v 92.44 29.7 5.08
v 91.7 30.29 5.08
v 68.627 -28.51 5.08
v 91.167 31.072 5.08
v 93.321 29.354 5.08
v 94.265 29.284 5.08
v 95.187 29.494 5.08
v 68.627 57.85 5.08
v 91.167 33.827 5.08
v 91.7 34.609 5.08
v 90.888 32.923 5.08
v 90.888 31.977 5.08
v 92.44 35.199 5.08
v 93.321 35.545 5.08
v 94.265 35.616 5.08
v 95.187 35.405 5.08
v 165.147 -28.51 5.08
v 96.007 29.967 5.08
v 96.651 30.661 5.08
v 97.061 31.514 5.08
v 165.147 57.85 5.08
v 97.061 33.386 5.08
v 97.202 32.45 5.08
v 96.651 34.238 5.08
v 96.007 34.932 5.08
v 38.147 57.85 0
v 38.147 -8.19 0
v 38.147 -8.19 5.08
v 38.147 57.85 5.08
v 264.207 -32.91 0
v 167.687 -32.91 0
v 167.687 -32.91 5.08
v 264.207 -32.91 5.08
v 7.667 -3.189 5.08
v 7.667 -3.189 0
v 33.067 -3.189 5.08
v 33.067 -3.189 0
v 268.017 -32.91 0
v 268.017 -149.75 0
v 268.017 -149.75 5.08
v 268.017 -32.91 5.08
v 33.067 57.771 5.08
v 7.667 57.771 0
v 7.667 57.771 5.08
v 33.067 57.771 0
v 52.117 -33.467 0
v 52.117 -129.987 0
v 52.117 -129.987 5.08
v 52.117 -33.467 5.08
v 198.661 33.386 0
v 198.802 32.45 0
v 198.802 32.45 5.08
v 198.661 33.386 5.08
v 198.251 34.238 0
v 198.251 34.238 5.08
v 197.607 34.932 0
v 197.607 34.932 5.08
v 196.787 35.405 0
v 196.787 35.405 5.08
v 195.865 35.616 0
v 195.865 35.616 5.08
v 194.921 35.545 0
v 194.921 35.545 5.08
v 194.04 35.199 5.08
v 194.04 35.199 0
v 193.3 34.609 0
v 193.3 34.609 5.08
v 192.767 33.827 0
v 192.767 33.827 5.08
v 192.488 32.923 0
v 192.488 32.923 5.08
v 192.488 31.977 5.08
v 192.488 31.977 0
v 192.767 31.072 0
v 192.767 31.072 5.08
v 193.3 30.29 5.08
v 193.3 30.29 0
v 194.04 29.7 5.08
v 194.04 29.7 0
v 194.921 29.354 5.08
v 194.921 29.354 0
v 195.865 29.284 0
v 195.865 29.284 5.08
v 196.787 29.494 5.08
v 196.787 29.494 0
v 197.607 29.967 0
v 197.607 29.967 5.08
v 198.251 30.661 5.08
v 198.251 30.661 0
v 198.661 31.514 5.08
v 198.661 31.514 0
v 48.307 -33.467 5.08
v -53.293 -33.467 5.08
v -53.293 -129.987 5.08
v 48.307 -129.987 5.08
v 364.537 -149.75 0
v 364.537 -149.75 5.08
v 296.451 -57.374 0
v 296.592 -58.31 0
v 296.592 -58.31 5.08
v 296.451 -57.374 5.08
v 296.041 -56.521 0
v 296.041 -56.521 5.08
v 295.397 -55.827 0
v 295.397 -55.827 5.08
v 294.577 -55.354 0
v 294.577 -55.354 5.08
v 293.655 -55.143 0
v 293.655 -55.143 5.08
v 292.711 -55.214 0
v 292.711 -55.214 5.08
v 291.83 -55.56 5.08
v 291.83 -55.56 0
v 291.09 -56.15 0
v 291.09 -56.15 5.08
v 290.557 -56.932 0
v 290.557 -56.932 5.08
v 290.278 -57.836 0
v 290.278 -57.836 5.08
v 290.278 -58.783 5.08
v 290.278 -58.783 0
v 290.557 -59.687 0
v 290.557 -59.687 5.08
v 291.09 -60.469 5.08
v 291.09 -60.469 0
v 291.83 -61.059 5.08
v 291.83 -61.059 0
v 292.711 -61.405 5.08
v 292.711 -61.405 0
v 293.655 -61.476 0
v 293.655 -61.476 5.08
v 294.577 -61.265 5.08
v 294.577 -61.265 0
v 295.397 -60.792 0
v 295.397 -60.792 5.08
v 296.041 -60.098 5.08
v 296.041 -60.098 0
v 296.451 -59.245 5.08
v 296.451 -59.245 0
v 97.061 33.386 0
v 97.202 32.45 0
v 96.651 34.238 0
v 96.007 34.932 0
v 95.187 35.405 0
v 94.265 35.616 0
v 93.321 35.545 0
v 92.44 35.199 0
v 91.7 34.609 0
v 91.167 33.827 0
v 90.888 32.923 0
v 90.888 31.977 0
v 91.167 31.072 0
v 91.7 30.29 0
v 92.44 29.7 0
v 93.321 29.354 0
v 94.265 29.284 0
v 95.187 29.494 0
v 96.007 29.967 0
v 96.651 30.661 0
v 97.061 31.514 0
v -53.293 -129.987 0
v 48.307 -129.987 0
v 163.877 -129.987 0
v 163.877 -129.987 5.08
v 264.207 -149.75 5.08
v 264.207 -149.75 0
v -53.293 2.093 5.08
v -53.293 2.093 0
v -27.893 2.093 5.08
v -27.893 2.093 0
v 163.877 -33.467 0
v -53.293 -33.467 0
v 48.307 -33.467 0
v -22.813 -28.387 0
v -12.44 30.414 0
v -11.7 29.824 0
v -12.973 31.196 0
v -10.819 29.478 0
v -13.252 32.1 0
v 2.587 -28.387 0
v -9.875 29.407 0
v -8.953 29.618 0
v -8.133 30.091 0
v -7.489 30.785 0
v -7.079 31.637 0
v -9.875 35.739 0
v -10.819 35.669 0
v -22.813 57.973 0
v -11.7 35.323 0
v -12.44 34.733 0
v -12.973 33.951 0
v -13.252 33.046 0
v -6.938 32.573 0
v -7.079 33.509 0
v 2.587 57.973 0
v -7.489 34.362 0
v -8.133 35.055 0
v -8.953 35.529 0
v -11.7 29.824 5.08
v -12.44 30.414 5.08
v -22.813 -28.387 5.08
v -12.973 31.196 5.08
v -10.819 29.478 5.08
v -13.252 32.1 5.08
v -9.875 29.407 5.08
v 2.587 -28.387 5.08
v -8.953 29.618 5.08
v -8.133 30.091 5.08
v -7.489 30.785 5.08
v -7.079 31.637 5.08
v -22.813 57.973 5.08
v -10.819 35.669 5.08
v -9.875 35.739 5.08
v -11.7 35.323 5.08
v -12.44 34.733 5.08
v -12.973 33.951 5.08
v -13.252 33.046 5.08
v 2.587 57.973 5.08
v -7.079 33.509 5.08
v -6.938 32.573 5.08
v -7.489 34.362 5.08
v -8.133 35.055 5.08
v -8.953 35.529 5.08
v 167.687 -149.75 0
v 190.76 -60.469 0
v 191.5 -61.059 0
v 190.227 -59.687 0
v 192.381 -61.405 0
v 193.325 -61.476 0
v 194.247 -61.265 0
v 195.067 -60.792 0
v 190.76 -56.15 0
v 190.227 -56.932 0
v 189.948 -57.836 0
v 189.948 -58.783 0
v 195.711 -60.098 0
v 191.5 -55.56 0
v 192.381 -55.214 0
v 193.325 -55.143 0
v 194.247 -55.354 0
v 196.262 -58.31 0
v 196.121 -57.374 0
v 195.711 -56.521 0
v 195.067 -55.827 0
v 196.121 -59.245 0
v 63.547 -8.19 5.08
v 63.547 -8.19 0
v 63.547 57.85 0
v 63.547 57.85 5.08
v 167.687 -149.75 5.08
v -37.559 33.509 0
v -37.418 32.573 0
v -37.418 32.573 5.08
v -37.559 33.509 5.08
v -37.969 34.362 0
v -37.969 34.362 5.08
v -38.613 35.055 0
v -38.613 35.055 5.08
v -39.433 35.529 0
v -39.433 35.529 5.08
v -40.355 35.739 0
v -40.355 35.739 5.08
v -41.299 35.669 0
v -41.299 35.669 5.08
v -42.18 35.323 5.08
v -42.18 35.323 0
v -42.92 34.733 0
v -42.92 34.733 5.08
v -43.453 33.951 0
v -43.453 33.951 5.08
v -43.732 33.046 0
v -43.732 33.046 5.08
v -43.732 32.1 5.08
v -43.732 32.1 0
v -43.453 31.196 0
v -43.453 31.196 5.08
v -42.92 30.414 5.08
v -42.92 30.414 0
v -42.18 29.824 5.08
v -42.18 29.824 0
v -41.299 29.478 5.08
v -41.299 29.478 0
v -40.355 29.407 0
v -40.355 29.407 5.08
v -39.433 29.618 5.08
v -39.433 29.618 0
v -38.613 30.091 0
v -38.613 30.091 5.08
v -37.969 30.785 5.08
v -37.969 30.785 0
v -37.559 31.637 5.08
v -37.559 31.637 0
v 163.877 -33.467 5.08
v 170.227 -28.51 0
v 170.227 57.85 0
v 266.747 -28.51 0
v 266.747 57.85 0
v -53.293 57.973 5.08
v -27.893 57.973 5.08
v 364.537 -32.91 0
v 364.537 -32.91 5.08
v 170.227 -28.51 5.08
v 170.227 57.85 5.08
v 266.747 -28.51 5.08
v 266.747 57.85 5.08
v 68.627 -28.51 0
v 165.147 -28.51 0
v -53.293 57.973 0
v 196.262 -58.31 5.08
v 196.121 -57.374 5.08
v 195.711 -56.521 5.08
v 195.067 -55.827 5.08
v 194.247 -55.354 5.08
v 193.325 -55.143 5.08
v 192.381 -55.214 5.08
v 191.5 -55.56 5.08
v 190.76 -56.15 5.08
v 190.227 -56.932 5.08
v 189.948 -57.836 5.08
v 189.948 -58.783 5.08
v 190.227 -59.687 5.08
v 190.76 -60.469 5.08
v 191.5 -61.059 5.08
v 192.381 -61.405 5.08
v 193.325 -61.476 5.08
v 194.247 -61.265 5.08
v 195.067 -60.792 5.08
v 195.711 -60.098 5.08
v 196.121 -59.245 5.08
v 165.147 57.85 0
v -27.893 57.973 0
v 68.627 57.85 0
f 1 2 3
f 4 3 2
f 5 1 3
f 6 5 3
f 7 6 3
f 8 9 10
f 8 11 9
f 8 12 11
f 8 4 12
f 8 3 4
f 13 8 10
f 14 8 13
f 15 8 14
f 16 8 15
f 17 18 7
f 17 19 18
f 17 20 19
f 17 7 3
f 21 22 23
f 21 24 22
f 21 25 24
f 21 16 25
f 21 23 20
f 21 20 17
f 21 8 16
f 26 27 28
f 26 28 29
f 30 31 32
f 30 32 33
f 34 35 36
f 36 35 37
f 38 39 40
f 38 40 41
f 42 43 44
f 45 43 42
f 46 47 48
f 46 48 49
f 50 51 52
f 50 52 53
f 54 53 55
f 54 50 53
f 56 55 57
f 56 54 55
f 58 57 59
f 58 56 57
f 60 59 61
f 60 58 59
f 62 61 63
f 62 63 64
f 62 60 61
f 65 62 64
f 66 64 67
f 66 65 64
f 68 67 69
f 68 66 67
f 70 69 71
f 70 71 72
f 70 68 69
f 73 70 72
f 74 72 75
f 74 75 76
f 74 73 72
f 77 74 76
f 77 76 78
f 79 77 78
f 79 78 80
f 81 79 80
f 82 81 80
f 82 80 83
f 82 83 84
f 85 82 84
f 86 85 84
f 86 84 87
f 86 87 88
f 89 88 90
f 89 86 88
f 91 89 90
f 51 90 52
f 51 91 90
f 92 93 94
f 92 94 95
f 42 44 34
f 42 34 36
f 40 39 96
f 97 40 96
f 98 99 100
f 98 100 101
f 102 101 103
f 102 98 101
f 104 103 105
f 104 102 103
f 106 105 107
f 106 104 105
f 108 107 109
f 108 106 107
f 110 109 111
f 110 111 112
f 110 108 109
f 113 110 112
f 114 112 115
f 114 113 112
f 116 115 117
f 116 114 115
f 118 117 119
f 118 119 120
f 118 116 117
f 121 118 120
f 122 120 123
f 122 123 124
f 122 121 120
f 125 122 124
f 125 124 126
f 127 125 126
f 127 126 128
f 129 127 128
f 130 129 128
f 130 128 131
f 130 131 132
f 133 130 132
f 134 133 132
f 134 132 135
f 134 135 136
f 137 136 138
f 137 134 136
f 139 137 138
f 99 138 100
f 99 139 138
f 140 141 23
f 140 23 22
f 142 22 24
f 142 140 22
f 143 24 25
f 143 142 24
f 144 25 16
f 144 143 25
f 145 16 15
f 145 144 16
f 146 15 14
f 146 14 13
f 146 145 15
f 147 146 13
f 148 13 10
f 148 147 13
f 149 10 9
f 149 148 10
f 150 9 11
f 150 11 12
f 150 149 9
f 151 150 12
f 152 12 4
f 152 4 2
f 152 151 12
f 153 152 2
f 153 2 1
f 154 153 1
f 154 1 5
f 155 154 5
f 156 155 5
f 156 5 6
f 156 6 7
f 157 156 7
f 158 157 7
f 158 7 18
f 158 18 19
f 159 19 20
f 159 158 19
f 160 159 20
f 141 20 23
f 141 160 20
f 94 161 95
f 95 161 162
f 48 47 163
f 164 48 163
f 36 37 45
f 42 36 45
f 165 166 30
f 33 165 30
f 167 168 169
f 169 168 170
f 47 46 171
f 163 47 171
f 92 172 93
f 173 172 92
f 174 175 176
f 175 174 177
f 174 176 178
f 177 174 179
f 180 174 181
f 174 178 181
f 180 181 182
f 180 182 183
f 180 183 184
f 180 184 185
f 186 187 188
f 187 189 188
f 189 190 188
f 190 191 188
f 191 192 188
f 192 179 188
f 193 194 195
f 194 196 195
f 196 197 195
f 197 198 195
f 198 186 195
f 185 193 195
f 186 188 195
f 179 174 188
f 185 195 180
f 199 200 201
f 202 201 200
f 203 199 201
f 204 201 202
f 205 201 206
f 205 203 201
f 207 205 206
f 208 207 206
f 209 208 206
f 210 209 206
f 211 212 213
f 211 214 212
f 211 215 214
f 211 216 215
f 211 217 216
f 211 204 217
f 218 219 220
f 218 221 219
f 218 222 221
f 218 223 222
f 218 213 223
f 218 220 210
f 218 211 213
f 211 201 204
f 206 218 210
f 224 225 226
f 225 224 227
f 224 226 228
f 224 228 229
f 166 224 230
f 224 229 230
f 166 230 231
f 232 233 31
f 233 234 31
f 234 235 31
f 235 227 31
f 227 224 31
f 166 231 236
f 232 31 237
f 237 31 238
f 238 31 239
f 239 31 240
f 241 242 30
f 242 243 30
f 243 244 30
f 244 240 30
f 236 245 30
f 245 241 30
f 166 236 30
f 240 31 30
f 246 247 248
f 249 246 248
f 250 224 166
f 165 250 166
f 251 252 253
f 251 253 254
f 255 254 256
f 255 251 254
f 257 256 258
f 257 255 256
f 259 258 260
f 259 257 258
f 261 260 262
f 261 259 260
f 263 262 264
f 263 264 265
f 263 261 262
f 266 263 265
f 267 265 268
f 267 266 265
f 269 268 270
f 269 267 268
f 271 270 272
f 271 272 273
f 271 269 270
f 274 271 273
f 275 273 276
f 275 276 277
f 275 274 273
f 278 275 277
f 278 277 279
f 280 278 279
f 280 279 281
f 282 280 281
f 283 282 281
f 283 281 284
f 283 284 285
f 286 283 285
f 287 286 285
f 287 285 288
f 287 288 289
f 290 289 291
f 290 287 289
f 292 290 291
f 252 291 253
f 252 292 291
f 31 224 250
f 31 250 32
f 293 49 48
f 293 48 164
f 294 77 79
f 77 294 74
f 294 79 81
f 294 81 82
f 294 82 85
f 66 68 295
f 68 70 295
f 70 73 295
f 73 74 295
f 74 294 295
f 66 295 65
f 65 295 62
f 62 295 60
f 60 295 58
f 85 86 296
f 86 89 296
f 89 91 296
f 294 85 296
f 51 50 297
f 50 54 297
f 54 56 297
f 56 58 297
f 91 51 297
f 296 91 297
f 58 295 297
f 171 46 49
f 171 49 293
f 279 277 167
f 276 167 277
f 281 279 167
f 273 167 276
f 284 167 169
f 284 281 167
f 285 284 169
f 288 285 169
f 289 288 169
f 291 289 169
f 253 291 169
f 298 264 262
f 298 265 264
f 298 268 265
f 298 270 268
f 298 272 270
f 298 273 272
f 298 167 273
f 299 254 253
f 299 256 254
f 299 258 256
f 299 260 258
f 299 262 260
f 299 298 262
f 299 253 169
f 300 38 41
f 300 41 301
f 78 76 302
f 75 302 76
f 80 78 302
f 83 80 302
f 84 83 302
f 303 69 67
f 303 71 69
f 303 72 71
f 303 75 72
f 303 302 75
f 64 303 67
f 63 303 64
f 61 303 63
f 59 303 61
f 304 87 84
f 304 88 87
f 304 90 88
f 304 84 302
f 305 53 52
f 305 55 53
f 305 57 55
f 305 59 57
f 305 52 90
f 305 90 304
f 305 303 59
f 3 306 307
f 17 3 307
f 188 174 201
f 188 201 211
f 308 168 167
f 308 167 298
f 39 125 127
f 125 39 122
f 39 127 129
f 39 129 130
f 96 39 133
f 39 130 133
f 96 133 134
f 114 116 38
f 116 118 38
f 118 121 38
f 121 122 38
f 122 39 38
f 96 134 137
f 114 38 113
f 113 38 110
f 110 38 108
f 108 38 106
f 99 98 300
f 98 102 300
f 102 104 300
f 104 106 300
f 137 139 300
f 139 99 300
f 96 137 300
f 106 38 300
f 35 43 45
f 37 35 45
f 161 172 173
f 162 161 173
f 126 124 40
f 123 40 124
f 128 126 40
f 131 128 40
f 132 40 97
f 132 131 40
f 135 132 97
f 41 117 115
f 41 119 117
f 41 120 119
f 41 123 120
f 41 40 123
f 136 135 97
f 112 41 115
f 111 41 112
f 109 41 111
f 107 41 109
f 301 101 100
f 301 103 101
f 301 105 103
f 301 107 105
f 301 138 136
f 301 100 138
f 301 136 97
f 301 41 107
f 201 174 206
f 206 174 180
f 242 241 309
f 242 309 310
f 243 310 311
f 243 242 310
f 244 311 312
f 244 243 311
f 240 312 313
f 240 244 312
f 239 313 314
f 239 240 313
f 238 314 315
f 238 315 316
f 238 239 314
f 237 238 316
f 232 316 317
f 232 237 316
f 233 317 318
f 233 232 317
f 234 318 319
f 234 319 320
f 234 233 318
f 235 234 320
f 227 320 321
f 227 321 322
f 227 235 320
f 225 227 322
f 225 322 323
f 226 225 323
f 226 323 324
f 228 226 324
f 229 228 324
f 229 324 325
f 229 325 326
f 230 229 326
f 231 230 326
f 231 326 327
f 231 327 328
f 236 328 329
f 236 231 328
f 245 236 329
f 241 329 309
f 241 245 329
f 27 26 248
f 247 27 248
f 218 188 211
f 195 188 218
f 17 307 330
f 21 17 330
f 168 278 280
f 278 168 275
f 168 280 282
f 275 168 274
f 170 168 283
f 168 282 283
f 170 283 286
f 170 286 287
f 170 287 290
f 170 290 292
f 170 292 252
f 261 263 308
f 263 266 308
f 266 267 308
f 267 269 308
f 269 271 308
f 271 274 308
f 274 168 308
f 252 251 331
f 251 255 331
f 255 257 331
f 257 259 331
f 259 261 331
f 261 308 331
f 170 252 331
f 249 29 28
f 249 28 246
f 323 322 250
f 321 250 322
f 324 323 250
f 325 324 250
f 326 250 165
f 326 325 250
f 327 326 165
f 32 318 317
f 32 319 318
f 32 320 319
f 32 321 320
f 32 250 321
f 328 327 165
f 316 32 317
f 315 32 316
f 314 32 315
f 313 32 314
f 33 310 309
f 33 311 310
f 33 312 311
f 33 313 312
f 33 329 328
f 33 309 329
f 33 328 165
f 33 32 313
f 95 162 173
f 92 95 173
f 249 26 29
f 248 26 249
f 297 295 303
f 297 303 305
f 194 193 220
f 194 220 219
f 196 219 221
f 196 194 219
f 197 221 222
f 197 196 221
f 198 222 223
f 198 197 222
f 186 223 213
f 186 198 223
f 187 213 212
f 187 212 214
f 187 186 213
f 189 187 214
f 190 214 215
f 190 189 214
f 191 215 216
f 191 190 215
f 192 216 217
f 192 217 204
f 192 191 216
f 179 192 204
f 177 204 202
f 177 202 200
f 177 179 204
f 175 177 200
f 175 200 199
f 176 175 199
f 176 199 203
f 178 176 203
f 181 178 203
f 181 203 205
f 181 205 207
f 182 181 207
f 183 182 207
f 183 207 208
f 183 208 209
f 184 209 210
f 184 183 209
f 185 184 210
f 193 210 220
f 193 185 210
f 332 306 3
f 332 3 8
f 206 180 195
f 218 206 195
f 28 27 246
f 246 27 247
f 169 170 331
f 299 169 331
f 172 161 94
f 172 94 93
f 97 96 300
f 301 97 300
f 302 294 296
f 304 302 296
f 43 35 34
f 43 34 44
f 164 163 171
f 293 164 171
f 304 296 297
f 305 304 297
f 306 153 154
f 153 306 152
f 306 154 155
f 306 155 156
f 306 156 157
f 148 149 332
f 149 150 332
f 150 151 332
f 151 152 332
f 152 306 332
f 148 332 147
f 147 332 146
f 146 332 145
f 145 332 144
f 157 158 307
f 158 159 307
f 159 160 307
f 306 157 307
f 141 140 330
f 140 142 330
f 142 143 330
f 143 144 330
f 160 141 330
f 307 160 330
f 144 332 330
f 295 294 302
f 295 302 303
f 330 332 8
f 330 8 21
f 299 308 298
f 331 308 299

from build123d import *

# Parameters (mm, degrees)
SKETCH1_W              = 25.4
SKETCH1_H              = 55.88
SKETCH1_R              = 3.175
BOSS_EXTRUDE1_DEPTH    = 5.08
SKETCH1_H_2            = 86.36
BOSS_EXTRUDE1_2_DEPTH  = 5.08
SKETCH1_H_3            = 60.96
BOSS_EXTRUDE1_3_DEPTH  = 5.08
SKETCH1_H_4            = 66.04
BOSS_EXTRUDE1_4_DEPTH  = 5.08
SKETCH1_W_2            = 101.6
SKETCH1_H_5            = 96.52
BOSS_EXTRUDE1_5_DEPTH  = 5.08
SKETCH1_W_3            = 111.76
BOSS_EXTRUDE1_6_DEPTH  = 5.08
SKETCH1_W_4            = 96.52
BOSS_EXTRUDE1_7_DEPTH  = 5.08
BOSS_EXTRUDE1_8_DEPTH  = 5.08
SKETCH1_H_6            = 116.84
BOSS_EXTRUDE1_9_DEPTH  = 5.08
BOSS_EXTRUDE1_10_DEPTH = 5.08


with BuildPart() as part:
    # Sketch1 → Boss-Extrude1 (new body)
    with BuildSketch(Plane.XY):
        with Locations((-40.59263907, 30.033148148)):
            Rectangle(SKETCH1_W, SKETCH1_H)
        with Locations((-40.59263907, 32.573148148)):
            Circle(SKETCH1_R, mode=Mode.SUBTRACT)
    extrude(amount=BOSS_EXTRUDE1_DEPTH)


with BuildPart() as body_2:
    # Sketch1 → Boss-Extrude1 2 (new body)
    with BuildSketch(Plane.XY):
        with Locations((-10.11263907, 14.793148148)):
            Rectangle(SKETCH1_W, SKETCH1_H_2)
        with Locations((-10.11263907, 32.573148148)):
            Circle(SKETCH1_R, mode=Mode.SUBTRACT)
    extrude(amount=BOSS_EXTRUDE1_2_DEPTH)


with BuildPart() as body_3:
    # Sketch1 → Boss-Extrude1 3 (new body)
    with BuildSketch(Plane.XY):
        with Locations((20.36736093, 27.290748183)):
            Rectangle(SKETCH1_W, SKETCH1_H_3)
    extrude(amount=BOSS_EXTRUDE1_3_DEPTH)


with BuildPart() as body_4:
    # Sketch1 → Boss-Extrude1 4 (new body)
    with BuildSketch(Plane.XY):
        with Locations((50.84736093, 24.829806874)):
            Rectangle(SKETCH1_W, SKETCH1_H_4)
    extrude(amount=BOSS_EXTRUDE1_4_DEPTH)


with BuildPart() as body_5:
    # Sketch1 → Boss-Extrude1 5 (new body)
    with BuildSketch(Plane.XY):
        with Locations((-2.49263907, -81.726851852)):
            Rectangle(SKETCH1_W_2, SKETCH1_H_5)
    extrude(amount=BOSS_EXTRUDE1_5_DEPTH)


with BuildPart() as body_6:
    # Sketch1 → Boss-Extrude1 6 (new body)
    with BuildSketch(Plane.XY):
        with Locations((107.99736093, -81.726851852)):
            Rectangle(SKETCH1_W_3, SKETCH1_H_5)
    extrude(amount=BOSS_EXTRUDE1_6_DEPTH)


with BuildPart() as body_7:
    # Sketch1 → Boss-Extrude1 7 (new body)
    with BuildSketch(Plane.XY):
        with Locations((116.88736093, 14.669806874)):
            Rectangle(SKETCH1_W_4, SKETCH1_H_2)
        with Locations((94.02736093, 32.449806874)):
            Circle(SKETCH1_R, mode=Mode.SUBTRACT)
    extrude(amount=BOSS_EXTRUDE1_7_DEPTH)


with BuildPart() as body_8:
    # Sketch1 → Boss-Extrude1 8 (new body)
    with BuildSketch(Plane.XY):
        with Locations((218.48736093, 14.669806874)):
            Rectangle(SKETCH1_W_4, SKETCH1_H_2)
        with Locations((195.62736093, 32.449806874)):
            Circle(SKETCH1_R, mode=Mode.SUBTRACT)
    extrude(amount=BOSS_EXTRUDE1_8_DEPTH)


with BuildPart() as body_9:
    # Sketch1 → Boss-Extrude1 9 (new body)
    with BuildSketch(Plane.XY):
        with Locations((215.94736093, -91.329602177)):
            Rectangle(SKETCH1_W_4, SKETCH1_H_6)
        with Locations((193.08736093, -58.309602177)):
            Circle(SKETCH1_R, mode=Mode.SUBTRACT)
    extrude(amount=BOSS_EXTRUDE1_9_DEPTH)


with BuildPart() as body_10:
    # Sketch1 → Boss-Extrude1 10 (new body)
    with BuildSketch(Plane.XY):
        with Locations((316.27736093, -91.329602177)):
            Rectangle(SKETCH1_W_4, SKETCH1_H_6)
        with Locations((293.41736093, -58.309602177)):
            Circle(SKETCH1_R, mode=Mode.SUBTRACT)
    extrude(amount=BOSS_EXTRUDE1_10_DEPTH)


solid = Compound([part.part, body_2.part, body_3.part, body_4.part, body_5.part, body_6.part, body_7.part, body_8.part, body_9.part, body_10.part])
